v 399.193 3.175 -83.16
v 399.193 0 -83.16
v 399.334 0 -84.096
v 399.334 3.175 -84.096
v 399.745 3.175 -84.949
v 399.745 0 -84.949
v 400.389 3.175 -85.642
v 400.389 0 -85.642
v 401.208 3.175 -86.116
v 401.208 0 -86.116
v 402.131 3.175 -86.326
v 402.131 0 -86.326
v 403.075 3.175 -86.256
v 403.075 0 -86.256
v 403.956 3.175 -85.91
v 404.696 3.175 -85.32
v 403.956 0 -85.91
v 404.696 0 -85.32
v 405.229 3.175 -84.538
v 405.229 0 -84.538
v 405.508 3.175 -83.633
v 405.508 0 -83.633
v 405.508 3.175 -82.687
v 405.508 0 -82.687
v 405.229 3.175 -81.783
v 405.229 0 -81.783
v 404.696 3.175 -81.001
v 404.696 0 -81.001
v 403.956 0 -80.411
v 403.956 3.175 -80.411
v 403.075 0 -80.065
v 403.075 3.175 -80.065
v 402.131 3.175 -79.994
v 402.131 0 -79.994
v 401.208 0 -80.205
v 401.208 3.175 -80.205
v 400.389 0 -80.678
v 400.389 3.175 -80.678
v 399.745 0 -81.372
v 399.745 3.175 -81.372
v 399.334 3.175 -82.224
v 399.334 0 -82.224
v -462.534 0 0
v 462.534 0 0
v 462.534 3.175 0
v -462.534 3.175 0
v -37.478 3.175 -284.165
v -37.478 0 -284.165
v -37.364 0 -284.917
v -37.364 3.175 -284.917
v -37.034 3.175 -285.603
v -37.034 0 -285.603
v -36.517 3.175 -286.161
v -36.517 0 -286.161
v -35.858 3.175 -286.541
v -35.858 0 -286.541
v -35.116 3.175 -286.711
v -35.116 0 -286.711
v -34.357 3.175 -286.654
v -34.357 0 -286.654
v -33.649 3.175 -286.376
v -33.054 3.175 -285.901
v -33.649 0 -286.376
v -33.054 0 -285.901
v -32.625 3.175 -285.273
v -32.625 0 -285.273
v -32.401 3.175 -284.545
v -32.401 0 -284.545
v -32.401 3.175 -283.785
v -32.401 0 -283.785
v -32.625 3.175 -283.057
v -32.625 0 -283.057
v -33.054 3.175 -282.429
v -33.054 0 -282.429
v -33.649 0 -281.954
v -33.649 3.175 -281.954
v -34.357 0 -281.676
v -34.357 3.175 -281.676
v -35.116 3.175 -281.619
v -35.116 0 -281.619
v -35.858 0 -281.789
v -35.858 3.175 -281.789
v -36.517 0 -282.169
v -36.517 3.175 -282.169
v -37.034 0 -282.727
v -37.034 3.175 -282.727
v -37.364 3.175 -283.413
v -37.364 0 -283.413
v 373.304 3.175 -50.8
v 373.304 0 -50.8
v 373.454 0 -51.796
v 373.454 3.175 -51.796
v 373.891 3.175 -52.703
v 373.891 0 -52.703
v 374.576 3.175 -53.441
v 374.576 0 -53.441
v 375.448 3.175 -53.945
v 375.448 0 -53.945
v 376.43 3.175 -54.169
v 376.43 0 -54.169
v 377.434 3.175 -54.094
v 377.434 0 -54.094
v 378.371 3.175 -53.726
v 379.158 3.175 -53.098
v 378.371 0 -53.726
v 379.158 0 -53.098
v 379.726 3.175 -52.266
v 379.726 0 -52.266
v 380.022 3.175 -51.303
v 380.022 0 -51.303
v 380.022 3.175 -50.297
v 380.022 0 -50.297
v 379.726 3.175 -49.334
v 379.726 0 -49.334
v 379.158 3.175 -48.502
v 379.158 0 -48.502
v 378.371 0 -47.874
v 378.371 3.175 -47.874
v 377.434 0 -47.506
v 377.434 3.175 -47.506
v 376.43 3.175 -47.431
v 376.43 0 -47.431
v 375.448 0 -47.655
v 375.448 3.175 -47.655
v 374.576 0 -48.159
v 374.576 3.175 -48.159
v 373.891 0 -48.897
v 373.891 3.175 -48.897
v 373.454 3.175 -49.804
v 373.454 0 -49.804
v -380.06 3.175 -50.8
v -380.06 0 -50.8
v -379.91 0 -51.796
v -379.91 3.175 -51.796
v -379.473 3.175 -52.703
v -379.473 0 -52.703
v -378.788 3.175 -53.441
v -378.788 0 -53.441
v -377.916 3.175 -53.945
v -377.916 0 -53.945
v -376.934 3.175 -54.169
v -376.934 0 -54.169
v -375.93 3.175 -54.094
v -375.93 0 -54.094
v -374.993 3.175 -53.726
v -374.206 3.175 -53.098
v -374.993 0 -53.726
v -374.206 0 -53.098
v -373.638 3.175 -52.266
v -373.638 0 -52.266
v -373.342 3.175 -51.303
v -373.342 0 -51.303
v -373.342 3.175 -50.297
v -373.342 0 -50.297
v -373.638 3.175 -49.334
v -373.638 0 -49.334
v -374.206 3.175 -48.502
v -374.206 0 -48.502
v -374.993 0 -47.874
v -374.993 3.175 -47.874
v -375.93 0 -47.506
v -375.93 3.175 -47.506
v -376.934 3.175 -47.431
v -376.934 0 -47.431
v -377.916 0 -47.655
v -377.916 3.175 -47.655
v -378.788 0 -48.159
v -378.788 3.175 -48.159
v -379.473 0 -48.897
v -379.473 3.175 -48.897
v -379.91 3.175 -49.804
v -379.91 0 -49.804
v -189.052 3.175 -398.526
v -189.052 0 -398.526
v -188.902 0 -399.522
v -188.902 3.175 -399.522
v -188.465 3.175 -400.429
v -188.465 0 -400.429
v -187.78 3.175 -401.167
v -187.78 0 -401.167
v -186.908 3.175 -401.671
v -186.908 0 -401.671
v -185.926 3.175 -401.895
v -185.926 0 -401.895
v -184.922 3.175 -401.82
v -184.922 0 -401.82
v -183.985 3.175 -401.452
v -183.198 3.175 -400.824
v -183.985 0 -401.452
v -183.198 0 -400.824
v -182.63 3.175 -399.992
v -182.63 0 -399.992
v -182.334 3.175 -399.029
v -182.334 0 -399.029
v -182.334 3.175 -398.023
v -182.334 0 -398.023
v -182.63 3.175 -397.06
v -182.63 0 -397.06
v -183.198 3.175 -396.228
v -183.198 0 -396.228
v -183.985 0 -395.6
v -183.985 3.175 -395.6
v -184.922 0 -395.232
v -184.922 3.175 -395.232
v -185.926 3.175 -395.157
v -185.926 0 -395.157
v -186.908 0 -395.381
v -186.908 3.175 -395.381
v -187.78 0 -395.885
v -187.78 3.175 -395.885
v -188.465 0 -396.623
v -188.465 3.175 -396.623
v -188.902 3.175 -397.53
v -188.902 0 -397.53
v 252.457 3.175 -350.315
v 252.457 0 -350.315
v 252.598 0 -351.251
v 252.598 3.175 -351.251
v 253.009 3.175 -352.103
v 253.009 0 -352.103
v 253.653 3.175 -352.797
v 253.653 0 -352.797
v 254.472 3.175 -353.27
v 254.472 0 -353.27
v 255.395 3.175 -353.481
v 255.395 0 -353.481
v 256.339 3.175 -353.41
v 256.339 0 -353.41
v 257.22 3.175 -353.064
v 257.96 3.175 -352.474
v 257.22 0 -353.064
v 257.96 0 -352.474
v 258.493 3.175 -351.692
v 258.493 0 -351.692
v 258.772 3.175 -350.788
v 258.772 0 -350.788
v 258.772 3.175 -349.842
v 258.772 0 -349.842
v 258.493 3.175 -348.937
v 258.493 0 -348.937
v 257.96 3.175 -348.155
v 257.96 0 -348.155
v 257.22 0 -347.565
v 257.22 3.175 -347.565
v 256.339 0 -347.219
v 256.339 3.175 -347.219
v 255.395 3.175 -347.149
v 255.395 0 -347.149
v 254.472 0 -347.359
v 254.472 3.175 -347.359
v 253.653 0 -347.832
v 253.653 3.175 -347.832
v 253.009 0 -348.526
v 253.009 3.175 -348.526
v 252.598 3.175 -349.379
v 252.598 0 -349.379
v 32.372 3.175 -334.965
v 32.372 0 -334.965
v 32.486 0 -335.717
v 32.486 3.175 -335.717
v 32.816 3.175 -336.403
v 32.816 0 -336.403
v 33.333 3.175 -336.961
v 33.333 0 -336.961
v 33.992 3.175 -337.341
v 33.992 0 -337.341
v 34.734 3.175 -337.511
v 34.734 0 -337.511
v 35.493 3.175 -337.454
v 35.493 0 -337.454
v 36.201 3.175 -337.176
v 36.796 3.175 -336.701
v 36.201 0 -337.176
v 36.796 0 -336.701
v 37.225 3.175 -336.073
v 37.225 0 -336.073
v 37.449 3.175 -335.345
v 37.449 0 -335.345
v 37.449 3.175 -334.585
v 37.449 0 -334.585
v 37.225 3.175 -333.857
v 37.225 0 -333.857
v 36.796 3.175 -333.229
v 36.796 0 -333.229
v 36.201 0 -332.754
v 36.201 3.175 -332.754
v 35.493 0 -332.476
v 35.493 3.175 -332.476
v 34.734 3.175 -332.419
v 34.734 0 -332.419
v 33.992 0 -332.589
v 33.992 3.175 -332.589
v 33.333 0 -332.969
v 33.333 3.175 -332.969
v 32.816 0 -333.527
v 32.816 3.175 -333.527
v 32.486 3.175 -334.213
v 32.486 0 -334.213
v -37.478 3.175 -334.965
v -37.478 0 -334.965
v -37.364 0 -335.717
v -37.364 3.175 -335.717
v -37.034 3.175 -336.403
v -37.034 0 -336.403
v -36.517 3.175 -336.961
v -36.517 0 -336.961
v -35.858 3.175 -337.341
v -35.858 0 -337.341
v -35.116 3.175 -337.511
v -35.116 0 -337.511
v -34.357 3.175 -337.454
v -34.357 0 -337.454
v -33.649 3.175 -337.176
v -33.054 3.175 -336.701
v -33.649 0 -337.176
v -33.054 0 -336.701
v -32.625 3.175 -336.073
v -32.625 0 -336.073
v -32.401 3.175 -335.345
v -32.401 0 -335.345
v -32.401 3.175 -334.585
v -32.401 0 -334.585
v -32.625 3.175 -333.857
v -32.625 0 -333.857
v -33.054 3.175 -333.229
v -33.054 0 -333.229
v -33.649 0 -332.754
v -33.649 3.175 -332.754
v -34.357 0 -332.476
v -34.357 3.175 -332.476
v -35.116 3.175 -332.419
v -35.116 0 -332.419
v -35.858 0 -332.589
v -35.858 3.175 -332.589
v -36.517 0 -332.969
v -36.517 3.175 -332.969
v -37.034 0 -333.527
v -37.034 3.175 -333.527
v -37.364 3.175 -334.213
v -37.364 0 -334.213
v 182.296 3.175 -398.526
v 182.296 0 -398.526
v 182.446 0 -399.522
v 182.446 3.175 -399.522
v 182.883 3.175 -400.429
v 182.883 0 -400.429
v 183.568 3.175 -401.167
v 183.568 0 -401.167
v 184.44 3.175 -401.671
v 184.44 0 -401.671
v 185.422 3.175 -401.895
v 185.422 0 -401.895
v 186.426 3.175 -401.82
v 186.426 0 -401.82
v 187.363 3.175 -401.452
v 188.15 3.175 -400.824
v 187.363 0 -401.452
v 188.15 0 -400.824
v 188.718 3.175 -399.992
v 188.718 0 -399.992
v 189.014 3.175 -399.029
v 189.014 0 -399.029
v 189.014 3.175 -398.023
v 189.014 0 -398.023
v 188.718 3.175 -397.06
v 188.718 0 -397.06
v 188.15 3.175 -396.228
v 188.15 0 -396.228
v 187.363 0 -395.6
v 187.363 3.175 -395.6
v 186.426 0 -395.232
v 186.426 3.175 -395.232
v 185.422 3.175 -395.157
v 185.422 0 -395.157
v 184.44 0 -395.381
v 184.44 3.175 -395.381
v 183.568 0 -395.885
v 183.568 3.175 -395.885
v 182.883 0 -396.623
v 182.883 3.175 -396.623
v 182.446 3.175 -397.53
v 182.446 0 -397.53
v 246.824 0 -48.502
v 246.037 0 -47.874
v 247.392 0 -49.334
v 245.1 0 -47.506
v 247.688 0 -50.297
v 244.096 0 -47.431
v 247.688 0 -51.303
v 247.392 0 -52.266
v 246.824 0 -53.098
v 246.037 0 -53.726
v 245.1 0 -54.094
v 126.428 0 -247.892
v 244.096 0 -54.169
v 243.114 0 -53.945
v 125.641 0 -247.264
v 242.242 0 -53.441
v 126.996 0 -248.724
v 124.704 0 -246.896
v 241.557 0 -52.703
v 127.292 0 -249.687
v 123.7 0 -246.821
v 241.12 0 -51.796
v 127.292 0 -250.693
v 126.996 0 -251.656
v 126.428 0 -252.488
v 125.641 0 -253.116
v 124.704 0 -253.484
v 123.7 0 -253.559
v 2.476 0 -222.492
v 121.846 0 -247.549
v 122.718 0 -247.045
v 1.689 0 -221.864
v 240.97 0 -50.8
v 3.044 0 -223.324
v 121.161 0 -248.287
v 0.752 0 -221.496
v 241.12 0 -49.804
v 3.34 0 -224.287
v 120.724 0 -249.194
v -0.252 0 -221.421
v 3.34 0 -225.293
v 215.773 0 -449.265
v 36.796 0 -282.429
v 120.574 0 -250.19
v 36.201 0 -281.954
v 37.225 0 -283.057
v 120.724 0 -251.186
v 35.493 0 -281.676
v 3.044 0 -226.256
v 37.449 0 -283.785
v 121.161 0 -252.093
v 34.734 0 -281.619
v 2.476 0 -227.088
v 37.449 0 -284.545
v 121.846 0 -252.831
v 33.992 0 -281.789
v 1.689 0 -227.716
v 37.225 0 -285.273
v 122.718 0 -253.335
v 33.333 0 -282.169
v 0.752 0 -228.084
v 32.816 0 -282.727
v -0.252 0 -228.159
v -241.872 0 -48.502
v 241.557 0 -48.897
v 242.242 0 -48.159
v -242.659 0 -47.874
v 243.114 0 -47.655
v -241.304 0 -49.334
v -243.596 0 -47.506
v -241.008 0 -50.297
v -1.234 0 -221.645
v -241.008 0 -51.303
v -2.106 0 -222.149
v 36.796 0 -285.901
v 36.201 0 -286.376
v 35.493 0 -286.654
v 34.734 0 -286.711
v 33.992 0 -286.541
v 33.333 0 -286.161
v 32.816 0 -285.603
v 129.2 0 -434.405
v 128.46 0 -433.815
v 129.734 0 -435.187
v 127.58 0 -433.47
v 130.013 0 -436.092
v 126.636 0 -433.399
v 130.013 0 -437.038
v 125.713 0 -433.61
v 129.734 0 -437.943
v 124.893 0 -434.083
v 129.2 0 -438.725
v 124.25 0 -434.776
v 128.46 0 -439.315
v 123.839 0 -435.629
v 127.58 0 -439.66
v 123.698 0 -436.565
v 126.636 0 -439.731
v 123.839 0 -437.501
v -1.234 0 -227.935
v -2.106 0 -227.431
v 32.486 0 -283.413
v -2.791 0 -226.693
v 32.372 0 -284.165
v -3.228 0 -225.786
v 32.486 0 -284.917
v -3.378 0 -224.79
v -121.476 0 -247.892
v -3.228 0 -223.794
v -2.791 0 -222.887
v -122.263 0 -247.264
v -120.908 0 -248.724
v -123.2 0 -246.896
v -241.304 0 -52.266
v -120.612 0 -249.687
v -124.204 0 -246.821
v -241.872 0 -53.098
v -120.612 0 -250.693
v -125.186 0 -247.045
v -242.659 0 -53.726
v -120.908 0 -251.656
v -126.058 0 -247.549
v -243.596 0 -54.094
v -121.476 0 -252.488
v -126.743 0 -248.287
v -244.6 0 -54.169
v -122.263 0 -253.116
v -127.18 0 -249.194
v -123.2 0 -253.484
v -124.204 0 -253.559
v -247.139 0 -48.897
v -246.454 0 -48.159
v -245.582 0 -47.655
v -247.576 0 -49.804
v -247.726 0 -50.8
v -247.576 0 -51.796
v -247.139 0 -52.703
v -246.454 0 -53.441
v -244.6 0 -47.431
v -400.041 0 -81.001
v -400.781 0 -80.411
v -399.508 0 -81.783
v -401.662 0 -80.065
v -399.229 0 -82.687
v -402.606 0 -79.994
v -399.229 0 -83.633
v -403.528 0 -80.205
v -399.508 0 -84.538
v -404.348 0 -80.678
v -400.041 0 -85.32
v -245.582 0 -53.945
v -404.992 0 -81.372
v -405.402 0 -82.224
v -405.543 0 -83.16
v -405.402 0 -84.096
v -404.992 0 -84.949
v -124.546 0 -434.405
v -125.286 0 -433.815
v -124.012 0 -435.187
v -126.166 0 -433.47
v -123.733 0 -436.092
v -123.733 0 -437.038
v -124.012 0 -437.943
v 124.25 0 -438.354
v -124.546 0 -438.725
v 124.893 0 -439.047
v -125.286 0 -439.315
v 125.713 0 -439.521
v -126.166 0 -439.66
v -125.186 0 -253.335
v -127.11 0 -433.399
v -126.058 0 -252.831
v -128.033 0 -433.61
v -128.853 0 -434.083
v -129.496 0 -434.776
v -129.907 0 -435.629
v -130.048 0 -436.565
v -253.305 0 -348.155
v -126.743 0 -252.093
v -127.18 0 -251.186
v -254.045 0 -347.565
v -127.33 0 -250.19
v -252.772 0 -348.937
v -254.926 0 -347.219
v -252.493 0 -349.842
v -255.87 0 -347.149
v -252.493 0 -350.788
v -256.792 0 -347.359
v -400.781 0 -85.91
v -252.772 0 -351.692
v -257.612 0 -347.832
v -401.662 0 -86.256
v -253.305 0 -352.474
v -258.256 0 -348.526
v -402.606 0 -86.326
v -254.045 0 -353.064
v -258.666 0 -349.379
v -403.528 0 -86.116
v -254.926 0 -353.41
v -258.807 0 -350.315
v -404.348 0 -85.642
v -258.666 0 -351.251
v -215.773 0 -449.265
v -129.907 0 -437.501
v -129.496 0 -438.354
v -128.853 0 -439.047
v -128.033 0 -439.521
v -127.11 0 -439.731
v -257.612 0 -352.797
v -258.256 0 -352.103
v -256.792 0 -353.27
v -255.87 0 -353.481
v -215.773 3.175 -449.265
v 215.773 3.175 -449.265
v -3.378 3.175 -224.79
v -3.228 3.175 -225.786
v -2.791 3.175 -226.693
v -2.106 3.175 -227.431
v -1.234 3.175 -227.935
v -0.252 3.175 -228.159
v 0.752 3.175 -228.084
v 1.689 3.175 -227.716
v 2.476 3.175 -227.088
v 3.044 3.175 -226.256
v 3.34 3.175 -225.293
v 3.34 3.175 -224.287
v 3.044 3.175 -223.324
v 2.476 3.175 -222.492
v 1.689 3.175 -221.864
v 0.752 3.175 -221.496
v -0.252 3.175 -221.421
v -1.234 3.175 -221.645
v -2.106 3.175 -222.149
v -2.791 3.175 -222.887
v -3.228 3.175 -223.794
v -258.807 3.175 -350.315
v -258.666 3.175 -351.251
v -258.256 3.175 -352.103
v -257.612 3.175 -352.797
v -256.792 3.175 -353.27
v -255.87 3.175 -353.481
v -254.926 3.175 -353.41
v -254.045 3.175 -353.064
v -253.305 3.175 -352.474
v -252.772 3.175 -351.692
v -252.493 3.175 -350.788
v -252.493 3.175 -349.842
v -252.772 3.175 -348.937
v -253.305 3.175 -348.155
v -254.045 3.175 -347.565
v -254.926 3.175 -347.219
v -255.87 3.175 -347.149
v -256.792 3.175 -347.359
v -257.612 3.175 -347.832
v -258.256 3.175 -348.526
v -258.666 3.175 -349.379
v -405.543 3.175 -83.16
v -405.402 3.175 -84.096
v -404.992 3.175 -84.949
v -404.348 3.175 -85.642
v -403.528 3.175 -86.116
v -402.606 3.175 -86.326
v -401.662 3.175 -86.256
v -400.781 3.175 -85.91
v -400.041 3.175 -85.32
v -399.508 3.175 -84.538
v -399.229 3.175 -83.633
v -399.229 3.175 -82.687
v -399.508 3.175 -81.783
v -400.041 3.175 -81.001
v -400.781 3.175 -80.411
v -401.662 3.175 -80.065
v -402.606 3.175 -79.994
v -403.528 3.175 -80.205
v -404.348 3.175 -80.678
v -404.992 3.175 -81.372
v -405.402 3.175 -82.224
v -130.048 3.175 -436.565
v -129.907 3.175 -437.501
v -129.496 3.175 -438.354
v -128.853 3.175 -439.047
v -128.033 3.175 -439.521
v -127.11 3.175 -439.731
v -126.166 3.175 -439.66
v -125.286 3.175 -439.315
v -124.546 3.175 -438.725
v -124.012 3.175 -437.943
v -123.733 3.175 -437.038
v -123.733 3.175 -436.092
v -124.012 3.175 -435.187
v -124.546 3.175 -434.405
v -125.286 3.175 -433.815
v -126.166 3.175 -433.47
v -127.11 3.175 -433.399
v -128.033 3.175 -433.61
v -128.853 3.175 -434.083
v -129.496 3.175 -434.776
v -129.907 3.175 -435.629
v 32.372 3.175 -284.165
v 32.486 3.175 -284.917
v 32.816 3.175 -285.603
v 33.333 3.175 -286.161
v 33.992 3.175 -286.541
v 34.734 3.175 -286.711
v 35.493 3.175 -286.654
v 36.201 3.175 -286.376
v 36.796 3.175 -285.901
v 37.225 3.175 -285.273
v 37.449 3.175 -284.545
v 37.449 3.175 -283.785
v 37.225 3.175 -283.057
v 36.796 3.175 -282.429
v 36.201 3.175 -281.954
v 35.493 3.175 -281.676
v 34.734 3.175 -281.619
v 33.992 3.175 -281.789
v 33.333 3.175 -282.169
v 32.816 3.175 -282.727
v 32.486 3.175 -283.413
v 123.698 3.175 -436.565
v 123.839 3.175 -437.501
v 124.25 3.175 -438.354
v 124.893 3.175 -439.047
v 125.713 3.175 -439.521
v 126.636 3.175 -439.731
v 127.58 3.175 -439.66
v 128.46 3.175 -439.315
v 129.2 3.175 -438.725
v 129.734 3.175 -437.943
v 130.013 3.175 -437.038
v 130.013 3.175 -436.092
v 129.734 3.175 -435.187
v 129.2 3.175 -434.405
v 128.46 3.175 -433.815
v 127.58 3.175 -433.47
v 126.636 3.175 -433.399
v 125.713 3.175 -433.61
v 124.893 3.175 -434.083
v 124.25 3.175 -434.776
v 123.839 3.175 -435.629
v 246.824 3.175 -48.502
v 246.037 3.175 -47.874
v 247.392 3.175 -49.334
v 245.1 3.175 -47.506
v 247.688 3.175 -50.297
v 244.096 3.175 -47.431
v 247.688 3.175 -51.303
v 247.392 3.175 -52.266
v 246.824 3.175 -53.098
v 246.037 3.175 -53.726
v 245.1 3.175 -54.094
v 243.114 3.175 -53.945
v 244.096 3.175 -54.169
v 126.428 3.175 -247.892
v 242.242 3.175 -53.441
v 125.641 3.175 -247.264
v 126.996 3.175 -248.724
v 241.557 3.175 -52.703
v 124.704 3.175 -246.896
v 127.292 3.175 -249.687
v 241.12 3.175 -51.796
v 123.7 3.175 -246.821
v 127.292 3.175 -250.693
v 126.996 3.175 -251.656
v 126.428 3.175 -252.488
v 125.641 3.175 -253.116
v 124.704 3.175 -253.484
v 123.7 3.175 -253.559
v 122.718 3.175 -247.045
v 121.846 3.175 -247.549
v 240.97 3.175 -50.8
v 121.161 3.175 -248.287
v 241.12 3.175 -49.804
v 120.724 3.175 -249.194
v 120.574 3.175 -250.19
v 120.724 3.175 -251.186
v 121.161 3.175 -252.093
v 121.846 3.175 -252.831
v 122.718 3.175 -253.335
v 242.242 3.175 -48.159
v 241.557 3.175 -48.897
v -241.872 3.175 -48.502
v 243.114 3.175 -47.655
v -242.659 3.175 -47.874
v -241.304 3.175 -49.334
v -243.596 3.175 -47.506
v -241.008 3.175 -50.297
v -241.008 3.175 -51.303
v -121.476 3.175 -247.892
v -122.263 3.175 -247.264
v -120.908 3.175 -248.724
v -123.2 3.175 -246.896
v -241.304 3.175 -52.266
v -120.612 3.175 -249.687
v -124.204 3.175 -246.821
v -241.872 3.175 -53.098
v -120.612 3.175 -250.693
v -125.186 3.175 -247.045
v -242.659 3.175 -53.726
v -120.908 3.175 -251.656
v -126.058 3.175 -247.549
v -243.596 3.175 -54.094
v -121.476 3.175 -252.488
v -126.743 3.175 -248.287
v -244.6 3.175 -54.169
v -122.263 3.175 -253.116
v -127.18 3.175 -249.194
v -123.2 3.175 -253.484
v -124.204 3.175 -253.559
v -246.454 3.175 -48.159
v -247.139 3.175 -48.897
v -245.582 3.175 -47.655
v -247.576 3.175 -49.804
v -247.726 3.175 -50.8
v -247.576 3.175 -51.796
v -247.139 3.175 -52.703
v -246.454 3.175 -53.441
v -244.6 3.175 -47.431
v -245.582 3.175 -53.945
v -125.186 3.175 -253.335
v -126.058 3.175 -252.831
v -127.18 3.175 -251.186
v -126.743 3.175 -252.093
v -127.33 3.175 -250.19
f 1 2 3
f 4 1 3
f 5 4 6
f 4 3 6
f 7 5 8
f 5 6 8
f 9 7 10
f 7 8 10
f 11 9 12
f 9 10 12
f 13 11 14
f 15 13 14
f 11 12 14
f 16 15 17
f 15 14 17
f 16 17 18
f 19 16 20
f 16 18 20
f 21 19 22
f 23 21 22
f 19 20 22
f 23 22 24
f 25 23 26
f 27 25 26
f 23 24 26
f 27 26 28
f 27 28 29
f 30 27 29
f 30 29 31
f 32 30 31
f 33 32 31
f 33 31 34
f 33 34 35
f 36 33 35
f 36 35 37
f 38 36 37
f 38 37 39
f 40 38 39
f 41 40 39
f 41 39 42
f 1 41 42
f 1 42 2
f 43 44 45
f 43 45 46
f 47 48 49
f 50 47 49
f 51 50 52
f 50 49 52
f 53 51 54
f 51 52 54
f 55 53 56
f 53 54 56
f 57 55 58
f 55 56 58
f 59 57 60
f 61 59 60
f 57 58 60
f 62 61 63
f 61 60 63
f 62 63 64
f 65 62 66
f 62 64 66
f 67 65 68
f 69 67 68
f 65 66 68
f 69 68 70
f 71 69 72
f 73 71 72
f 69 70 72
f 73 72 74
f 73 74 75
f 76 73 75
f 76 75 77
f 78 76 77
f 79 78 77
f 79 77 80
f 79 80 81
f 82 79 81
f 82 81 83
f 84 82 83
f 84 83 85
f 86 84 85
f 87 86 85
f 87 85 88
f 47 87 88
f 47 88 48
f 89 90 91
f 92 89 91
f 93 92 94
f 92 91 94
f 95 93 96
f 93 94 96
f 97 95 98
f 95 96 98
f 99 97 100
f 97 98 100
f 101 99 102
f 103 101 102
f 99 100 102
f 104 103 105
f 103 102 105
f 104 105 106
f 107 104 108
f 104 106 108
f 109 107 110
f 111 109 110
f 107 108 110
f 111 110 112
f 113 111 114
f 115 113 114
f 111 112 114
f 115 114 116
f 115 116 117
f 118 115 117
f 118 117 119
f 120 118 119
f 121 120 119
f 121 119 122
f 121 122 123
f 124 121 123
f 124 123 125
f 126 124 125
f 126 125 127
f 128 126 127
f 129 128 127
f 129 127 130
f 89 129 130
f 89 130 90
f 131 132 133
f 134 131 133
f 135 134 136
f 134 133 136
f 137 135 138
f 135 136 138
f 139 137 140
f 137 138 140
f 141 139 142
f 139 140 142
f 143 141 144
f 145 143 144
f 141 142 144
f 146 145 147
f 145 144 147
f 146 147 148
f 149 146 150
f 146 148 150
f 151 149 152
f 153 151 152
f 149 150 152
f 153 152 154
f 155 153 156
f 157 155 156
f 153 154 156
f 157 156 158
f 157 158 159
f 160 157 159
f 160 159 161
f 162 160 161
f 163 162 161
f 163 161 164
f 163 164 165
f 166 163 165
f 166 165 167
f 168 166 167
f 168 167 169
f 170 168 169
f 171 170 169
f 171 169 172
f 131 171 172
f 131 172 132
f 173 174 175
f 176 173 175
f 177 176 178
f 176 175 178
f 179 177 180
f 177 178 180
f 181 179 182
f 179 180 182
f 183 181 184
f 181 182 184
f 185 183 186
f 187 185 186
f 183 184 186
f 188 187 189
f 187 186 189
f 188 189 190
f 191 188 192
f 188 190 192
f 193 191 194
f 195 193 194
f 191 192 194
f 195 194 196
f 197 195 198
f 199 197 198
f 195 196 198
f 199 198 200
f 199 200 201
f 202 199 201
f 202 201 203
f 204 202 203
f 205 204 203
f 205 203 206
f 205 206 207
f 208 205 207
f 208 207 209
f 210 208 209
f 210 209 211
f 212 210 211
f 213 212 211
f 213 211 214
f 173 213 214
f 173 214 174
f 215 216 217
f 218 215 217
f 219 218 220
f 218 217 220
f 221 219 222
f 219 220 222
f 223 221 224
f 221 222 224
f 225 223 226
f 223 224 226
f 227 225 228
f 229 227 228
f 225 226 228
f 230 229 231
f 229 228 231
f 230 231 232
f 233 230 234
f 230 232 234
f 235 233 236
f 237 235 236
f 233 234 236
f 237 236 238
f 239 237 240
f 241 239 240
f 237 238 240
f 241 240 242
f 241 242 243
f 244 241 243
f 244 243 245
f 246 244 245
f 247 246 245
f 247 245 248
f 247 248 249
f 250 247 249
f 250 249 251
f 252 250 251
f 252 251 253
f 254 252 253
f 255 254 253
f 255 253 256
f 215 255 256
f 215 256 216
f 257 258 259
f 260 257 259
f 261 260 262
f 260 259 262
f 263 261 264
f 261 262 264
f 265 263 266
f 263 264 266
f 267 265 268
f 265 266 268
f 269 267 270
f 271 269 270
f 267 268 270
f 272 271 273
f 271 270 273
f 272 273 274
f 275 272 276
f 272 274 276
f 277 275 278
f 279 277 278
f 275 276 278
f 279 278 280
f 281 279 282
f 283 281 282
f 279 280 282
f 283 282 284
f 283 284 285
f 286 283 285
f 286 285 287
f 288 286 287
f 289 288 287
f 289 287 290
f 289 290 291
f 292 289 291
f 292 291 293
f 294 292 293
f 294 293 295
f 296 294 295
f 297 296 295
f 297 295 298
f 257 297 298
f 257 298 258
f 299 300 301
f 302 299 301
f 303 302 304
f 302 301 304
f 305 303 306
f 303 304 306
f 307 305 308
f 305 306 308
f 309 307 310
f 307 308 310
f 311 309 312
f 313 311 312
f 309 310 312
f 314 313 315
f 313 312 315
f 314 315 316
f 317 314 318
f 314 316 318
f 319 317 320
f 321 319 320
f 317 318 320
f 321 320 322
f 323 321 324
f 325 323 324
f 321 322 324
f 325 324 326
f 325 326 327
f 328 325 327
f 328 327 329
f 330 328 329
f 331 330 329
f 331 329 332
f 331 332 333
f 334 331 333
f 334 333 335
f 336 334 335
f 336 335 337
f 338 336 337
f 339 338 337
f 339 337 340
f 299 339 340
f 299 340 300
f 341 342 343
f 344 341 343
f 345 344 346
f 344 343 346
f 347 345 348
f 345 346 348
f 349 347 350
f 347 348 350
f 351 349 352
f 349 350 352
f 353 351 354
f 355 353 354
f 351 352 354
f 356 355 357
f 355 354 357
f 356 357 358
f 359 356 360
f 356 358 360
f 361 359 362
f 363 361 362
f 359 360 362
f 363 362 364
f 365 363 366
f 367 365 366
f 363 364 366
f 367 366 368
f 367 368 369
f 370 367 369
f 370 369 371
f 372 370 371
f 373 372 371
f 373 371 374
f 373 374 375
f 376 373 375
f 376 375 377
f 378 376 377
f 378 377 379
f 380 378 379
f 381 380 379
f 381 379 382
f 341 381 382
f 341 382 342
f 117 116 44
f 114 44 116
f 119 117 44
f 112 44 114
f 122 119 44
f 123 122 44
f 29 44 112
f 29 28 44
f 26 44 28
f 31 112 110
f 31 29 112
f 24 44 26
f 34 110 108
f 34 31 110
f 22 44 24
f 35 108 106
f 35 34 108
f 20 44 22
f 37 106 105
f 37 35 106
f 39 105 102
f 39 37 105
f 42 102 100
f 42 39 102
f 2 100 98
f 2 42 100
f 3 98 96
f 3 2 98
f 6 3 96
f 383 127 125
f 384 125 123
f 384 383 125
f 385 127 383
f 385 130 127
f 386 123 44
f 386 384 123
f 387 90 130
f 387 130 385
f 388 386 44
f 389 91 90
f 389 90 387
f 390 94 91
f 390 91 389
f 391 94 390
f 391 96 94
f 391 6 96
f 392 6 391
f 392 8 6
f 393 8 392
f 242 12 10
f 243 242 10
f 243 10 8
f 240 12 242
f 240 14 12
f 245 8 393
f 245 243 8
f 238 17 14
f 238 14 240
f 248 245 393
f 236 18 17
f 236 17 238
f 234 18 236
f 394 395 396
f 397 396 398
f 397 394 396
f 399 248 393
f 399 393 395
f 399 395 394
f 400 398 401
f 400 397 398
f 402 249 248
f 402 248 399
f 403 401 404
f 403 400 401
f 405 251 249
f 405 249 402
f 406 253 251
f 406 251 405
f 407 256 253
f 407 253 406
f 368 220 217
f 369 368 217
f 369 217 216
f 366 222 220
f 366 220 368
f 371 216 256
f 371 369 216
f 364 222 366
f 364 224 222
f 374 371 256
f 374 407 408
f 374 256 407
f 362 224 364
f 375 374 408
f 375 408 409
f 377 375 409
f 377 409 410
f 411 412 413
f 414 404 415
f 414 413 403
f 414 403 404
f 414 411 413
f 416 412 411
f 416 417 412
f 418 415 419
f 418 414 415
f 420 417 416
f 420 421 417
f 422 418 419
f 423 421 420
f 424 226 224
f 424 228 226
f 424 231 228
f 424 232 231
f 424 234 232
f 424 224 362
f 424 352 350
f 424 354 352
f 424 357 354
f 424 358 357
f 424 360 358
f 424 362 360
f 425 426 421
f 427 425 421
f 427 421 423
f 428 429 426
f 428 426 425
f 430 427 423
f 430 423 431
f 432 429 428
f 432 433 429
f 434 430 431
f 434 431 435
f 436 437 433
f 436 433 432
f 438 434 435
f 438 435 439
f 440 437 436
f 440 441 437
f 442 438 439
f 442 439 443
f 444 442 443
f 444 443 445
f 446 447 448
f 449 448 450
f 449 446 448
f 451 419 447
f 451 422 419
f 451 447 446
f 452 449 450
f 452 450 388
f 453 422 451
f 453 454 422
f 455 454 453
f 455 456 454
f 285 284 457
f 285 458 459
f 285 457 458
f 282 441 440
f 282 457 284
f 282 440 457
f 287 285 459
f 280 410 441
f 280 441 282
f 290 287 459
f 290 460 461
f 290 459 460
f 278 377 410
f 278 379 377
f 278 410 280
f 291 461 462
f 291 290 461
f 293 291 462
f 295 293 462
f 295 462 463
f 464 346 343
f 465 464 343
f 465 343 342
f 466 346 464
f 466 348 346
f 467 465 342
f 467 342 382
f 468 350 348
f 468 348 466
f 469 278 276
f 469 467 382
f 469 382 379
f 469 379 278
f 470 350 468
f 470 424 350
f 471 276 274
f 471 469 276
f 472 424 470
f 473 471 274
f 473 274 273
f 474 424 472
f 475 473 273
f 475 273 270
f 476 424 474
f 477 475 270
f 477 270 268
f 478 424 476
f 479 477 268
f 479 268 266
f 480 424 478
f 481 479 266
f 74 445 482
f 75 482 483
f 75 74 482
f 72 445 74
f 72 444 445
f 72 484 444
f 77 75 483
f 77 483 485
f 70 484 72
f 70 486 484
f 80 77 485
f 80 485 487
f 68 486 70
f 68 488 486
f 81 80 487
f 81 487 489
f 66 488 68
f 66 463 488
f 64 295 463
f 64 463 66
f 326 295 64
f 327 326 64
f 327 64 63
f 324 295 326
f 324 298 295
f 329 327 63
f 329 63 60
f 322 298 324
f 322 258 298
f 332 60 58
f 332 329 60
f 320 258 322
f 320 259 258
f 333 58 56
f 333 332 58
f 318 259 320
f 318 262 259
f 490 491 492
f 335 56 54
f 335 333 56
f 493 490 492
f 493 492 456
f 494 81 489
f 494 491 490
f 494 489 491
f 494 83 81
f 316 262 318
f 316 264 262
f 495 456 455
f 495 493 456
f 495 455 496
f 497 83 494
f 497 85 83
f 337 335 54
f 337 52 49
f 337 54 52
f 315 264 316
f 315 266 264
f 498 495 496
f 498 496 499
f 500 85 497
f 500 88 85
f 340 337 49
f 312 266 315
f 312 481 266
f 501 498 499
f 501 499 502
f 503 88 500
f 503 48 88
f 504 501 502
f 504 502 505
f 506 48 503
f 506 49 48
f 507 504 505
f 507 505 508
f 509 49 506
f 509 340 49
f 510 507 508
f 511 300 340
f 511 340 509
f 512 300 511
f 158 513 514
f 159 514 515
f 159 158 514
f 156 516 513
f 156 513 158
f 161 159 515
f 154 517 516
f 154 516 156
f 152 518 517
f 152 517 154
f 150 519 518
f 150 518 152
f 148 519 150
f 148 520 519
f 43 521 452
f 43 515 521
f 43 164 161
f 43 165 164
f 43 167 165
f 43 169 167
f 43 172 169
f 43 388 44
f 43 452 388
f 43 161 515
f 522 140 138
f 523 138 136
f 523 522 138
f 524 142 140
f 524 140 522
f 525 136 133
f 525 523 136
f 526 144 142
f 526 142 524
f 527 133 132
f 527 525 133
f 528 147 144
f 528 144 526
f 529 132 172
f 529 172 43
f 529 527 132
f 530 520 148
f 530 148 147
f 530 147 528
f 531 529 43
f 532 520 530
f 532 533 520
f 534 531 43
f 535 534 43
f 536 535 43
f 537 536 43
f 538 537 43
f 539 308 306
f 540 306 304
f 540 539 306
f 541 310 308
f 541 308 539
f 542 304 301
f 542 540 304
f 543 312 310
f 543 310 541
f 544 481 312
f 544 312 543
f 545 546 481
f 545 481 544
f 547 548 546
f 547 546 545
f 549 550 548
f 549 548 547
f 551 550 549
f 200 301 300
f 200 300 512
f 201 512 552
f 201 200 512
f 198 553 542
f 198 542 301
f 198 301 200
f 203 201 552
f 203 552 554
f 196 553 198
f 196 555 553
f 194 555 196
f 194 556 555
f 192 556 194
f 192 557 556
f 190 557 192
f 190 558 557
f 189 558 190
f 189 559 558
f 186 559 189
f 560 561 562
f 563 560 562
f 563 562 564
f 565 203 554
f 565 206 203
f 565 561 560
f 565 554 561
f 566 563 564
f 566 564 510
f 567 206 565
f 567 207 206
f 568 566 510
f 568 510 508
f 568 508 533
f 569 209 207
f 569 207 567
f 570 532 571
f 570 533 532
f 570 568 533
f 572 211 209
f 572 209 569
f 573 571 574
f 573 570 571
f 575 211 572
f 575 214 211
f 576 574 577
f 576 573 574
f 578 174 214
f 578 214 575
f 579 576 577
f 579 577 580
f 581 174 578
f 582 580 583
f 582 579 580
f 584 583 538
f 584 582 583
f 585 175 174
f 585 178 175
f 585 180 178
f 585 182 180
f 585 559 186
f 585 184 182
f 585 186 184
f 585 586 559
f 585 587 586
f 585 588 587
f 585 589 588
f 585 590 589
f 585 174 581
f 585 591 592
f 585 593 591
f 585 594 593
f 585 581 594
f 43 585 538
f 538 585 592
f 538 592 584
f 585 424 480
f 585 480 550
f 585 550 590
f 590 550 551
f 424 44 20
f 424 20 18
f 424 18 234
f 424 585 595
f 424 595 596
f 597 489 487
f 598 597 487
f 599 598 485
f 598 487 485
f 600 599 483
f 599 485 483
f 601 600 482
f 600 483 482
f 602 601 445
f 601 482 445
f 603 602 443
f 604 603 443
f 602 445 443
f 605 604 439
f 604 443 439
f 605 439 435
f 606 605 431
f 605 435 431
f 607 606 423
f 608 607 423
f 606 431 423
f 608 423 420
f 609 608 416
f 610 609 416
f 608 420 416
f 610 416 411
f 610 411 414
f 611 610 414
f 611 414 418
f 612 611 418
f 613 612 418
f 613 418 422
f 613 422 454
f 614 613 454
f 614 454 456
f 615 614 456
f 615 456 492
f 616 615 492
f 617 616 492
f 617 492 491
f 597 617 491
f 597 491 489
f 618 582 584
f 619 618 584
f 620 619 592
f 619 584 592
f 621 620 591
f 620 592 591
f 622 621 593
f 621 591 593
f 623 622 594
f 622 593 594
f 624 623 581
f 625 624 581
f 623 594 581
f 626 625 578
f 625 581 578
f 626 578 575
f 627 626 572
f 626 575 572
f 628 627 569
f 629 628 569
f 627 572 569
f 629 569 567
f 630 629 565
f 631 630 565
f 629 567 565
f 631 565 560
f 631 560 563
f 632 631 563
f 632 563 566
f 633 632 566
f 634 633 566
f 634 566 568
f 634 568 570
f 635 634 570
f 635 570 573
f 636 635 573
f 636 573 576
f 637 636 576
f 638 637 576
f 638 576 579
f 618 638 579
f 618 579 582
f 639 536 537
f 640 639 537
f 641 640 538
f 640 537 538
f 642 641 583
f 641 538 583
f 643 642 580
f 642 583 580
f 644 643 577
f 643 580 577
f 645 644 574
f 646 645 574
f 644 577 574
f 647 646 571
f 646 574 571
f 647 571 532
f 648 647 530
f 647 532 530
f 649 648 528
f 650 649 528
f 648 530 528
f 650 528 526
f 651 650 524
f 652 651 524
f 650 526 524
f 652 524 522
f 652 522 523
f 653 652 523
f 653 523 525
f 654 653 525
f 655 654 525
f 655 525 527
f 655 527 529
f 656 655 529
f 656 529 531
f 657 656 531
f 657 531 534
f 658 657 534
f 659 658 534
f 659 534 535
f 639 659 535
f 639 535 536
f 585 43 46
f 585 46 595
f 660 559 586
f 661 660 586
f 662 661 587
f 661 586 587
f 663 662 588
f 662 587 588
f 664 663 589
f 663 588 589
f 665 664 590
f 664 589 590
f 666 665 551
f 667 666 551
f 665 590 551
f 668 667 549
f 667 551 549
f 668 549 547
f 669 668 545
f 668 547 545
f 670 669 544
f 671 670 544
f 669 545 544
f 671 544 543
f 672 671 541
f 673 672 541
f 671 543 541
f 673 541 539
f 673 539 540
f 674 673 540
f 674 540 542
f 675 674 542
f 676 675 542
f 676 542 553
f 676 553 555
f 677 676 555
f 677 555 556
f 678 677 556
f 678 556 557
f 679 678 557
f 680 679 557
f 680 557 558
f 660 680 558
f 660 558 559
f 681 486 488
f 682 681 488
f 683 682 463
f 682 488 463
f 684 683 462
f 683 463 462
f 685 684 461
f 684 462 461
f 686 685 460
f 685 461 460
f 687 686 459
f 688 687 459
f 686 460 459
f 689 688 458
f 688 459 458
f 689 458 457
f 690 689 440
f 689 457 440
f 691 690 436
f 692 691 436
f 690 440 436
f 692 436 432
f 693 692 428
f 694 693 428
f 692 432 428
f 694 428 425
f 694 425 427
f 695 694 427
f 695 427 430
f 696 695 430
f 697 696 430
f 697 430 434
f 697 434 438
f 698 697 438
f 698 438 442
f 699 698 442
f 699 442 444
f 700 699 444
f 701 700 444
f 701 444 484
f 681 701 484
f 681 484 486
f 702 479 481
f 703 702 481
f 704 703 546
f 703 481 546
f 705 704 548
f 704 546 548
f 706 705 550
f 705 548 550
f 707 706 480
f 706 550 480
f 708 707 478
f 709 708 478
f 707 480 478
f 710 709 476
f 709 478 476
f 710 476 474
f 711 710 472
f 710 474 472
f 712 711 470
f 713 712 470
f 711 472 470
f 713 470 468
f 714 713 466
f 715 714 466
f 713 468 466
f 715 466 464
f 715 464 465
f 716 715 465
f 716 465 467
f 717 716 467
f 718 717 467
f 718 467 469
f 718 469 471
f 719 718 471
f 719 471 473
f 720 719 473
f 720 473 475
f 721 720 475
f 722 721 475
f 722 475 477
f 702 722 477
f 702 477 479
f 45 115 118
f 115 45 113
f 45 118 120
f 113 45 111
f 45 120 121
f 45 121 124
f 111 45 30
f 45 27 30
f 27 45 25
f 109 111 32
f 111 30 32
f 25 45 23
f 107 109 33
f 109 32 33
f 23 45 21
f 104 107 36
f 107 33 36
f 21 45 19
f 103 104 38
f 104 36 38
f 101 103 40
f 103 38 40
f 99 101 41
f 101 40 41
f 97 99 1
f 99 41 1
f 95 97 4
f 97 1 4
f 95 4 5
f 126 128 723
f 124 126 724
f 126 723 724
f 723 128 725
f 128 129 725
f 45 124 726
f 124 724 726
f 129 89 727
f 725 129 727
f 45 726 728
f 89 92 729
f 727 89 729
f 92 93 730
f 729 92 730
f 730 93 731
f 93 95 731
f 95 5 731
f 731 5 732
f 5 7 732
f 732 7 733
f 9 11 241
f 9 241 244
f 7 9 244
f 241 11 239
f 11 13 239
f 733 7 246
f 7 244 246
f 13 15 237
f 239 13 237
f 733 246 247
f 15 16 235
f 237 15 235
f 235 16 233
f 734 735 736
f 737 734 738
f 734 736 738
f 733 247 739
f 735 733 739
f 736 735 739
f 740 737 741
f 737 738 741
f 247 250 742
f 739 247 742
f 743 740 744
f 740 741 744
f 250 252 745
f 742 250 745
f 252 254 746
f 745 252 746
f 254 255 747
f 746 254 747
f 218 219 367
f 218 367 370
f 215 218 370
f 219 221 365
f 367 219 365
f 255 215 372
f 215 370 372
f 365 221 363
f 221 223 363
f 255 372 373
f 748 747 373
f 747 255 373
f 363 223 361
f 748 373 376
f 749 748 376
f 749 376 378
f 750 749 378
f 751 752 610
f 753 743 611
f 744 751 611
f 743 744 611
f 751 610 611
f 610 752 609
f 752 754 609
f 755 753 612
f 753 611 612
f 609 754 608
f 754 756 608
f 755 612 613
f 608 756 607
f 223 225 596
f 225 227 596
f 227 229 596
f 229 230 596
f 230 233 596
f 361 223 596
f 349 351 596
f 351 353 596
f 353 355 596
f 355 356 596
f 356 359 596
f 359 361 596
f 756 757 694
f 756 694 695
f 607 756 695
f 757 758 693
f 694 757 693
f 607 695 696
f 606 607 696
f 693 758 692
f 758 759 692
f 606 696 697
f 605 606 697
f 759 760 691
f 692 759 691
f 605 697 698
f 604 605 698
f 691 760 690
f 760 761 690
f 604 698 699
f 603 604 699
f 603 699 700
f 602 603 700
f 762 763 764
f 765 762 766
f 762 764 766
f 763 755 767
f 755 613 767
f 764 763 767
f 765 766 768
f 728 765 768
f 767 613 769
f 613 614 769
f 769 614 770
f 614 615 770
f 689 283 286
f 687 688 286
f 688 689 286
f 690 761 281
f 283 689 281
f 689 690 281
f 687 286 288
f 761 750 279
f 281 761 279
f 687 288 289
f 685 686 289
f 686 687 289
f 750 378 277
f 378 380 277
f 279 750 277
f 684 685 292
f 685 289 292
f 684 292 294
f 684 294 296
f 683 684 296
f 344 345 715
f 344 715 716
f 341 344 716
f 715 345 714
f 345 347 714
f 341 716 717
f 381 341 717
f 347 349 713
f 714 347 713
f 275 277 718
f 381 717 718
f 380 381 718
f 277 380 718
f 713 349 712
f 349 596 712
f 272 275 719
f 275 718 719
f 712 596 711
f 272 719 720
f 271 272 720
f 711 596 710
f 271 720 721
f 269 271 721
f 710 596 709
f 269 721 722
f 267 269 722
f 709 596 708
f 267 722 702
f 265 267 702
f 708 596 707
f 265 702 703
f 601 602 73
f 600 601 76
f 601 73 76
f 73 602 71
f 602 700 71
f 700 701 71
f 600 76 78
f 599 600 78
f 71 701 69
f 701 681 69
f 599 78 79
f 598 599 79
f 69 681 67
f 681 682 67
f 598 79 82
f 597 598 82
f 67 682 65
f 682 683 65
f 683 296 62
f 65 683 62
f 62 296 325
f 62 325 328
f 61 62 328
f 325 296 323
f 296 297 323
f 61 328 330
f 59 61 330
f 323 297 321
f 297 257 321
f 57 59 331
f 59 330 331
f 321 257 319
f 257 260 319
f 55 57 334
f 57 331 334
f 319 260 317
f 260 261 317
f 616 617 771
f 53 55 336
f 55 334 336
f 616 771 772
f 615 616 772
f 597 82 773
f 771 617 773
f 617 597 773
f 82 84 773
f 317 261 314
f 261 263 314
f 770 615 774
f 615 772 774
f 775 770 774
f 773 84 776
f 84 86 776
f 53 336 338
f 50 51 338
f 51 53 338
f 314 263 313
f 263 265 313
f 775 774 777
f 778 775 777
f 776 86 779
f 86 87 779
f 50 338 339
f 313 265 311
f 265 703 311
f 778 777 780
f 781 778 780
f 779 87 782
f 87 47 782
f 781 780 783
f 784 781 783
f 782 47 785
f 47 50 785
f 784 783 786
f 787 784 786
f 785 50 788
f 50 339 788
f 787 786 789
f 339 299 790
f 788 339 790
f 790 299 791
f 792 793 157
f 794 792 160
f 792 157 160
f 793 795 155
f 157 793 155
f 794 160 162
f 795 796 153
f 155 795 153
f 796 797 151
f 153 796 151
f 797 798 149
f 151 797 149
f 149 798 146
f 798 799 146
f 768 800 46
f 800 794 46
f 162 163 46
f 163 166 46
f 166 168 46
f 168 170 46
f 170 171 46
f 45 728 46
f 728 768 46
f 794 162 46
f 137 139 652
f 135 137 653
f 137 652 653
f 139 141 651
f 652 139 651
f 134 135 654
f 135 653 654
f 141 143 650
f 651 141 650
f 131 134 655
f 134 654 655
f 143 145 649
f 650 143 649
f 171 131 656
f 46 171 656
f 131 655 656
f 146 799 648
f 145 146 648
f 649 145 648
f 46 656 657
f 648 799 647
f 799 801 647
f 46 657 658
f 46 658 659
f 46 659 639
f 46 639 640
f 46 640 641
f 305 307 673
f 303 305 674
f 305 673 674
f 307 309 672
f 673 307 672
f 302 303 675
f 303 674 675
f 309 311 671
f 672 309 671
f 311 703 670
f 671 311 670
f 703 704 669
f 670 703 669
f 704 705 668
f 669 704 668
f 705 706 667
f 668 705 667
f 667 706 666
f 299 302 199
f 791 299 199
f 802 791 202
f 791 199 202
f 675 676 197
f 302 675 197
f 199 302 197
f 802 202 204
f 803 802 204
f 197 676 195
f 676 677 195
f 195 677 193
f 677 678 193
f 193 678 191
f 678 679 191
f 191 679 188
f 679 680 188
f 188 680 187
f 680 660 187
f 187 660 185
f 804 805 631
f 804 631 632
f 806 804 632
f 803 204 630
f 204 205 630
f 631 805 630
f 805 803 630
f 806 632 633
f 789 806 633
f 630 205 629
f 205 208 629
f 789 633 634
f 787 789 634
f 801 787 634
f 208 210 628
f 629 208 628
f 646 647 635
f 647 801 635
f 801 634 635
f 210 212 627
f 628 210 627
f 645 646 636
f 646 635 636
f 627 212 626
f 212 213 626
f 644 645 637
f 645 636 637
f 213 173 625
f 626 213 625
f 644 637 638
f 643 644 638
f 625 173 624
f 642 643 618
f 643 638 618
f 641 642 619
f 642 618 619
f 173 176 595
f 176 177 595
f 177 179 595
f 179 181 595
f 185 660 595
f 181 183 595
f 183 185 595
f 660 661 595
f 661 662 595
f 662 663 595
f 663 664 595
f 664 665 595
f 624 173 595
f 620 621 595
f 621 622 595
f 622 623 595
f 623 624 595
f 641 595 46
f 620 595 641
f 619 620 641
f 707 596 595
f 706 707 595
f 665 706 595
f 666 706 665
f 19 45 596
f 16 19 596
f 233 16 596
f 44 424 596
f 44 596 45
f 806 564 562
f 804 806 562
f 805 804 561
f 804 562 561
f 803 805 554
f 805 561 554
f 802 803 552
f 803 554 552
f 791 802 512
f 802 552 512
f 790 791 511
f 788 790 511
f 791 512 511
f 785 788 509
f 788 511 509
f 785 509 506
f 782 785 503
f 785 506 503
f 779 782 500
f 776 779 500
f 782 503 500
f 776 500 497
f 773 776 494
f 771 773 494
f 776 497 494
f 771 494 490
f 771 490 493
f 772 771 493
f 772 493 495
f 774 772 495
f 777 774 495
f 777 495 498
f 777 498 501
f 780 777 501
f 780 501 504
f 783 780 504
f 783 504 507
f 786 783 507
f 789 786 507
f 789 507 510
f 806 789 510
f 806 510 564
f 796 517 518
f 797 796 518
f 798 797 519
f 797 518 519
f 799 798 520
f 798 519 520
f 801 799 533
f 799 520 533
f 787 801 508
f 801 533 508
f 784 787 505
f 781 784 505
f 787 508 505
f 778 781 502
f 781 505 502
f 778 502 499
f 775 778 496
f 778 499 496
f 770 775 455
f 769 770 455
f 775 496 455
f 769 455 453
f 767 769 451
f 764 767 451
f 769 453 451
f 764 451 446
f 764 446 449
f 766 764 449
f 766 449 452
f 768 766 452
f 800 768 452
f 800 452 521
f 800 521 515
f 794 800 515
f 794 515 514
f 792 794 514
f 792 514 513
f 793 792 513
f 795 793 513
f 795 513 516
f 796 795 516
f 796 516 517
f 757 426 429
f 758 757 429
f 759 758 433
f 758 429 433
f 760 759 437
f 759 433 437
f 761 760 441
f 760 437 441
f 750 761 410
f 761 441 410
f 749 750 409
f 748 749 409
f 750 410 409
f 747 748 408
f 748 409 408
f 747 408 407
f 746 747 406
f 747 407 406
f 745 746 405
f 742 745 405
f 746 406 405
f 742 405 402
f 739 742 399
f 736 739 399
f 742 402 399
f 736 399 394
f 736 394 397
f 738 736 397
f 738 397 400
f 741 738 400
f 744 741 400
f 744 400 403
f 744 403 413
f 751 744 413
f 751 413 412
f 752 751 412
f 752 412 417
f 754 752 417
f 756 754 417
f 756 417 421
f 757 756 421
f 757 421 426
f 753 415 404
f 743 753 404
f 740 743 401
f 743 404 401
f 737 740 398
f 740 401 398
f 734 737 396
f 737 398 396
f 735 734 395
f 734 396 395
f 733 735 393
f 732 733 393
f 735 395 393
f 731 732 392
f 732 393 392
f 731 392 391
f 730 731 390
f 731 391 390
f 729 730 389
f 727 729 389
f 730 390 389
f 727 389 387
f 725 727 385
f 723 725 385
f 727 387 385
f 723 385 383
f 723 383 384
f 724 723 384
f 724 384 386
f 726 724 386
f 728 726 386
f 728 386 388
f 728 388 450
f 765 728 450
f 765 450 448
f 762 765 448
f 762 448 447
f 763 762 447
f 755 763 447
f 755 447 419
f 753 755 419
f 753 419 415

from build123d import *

# Parameters (mm, degrees)
BOSS_EXTRUDE1_DEPTH         = 3.175
F_1_4_0_25_DIAMETER_HOLE1_D = 6.35
F_1_4_CLEARANCE_HOLE1_D     = 6.7564
F_7_0_201_DIAMETER_HOLE1_D  = 5.1054


with BuildPart() as part:
    # Sketch1 → Boss-Extrude1 (new body)
    with BuildSketch(Plane(origin=(0, 0, 0), x_dir=(1, 0, 0), z_dir=(0, 1, 0))):
        Polygon((-462.534, 0), (-215.773, 449.26502653), (215.773, 449.26502653), (462.534, 0), align=None)
    extrude(amount=BOSS_EXTRUDE1_DEPTH)

    # 1/4 (0.25) Diameter Hole1 (through all)
    with Locations(Plane(origin=(0, 3.175, 0), x_dir=(1, 0, 0), z_dir=(0, 1, 0))):
        with Locations((-402.368285269, 83.160171278), (-255.632309055, 350.314795577), (-126.873, 436.56502653), (402.368285269, 83.160171278), (255.632309055, 350.314795577), (126.873, 436.56502653)):
            Hole(F_1_4_0_25_DIAMETER_HOLE1_D / 2)

    # 1/4 Clearance Hole1 (through all)
    with Locations(Plane(origin=(0, 3.175, 0), x_dir=(1, 0, 0), z_dir=(0, 1, 0))):
        with Locations((-376.682, 50.8), (-244.348, 50.8), (-123.952, 250.19), (-185.674, 398.526), (0, 224.79), (376.682, 50.8), (244.348, 50.8), (185.674, 398.526), (123.952, 250.19)):
            Hole(F_1_4_CLEARANCE_HOLE1_D / 2)

    # #7 (0.201) Diameter Hole1 (through all)
    with Locations(Plane(origin=(0, 3.175, 0), x_dir=(1, 0, 0), z_dir=(0, 1, 0))):
        with Locations((34.925, 334.96502653), (-34.925, 334.96502653), (-34.925, 284.16502653), (34.925, 284.16502653)):
            Hole(F_7_0_201_DIAMETER_HOLE1_D / 2)


solid = part.part
